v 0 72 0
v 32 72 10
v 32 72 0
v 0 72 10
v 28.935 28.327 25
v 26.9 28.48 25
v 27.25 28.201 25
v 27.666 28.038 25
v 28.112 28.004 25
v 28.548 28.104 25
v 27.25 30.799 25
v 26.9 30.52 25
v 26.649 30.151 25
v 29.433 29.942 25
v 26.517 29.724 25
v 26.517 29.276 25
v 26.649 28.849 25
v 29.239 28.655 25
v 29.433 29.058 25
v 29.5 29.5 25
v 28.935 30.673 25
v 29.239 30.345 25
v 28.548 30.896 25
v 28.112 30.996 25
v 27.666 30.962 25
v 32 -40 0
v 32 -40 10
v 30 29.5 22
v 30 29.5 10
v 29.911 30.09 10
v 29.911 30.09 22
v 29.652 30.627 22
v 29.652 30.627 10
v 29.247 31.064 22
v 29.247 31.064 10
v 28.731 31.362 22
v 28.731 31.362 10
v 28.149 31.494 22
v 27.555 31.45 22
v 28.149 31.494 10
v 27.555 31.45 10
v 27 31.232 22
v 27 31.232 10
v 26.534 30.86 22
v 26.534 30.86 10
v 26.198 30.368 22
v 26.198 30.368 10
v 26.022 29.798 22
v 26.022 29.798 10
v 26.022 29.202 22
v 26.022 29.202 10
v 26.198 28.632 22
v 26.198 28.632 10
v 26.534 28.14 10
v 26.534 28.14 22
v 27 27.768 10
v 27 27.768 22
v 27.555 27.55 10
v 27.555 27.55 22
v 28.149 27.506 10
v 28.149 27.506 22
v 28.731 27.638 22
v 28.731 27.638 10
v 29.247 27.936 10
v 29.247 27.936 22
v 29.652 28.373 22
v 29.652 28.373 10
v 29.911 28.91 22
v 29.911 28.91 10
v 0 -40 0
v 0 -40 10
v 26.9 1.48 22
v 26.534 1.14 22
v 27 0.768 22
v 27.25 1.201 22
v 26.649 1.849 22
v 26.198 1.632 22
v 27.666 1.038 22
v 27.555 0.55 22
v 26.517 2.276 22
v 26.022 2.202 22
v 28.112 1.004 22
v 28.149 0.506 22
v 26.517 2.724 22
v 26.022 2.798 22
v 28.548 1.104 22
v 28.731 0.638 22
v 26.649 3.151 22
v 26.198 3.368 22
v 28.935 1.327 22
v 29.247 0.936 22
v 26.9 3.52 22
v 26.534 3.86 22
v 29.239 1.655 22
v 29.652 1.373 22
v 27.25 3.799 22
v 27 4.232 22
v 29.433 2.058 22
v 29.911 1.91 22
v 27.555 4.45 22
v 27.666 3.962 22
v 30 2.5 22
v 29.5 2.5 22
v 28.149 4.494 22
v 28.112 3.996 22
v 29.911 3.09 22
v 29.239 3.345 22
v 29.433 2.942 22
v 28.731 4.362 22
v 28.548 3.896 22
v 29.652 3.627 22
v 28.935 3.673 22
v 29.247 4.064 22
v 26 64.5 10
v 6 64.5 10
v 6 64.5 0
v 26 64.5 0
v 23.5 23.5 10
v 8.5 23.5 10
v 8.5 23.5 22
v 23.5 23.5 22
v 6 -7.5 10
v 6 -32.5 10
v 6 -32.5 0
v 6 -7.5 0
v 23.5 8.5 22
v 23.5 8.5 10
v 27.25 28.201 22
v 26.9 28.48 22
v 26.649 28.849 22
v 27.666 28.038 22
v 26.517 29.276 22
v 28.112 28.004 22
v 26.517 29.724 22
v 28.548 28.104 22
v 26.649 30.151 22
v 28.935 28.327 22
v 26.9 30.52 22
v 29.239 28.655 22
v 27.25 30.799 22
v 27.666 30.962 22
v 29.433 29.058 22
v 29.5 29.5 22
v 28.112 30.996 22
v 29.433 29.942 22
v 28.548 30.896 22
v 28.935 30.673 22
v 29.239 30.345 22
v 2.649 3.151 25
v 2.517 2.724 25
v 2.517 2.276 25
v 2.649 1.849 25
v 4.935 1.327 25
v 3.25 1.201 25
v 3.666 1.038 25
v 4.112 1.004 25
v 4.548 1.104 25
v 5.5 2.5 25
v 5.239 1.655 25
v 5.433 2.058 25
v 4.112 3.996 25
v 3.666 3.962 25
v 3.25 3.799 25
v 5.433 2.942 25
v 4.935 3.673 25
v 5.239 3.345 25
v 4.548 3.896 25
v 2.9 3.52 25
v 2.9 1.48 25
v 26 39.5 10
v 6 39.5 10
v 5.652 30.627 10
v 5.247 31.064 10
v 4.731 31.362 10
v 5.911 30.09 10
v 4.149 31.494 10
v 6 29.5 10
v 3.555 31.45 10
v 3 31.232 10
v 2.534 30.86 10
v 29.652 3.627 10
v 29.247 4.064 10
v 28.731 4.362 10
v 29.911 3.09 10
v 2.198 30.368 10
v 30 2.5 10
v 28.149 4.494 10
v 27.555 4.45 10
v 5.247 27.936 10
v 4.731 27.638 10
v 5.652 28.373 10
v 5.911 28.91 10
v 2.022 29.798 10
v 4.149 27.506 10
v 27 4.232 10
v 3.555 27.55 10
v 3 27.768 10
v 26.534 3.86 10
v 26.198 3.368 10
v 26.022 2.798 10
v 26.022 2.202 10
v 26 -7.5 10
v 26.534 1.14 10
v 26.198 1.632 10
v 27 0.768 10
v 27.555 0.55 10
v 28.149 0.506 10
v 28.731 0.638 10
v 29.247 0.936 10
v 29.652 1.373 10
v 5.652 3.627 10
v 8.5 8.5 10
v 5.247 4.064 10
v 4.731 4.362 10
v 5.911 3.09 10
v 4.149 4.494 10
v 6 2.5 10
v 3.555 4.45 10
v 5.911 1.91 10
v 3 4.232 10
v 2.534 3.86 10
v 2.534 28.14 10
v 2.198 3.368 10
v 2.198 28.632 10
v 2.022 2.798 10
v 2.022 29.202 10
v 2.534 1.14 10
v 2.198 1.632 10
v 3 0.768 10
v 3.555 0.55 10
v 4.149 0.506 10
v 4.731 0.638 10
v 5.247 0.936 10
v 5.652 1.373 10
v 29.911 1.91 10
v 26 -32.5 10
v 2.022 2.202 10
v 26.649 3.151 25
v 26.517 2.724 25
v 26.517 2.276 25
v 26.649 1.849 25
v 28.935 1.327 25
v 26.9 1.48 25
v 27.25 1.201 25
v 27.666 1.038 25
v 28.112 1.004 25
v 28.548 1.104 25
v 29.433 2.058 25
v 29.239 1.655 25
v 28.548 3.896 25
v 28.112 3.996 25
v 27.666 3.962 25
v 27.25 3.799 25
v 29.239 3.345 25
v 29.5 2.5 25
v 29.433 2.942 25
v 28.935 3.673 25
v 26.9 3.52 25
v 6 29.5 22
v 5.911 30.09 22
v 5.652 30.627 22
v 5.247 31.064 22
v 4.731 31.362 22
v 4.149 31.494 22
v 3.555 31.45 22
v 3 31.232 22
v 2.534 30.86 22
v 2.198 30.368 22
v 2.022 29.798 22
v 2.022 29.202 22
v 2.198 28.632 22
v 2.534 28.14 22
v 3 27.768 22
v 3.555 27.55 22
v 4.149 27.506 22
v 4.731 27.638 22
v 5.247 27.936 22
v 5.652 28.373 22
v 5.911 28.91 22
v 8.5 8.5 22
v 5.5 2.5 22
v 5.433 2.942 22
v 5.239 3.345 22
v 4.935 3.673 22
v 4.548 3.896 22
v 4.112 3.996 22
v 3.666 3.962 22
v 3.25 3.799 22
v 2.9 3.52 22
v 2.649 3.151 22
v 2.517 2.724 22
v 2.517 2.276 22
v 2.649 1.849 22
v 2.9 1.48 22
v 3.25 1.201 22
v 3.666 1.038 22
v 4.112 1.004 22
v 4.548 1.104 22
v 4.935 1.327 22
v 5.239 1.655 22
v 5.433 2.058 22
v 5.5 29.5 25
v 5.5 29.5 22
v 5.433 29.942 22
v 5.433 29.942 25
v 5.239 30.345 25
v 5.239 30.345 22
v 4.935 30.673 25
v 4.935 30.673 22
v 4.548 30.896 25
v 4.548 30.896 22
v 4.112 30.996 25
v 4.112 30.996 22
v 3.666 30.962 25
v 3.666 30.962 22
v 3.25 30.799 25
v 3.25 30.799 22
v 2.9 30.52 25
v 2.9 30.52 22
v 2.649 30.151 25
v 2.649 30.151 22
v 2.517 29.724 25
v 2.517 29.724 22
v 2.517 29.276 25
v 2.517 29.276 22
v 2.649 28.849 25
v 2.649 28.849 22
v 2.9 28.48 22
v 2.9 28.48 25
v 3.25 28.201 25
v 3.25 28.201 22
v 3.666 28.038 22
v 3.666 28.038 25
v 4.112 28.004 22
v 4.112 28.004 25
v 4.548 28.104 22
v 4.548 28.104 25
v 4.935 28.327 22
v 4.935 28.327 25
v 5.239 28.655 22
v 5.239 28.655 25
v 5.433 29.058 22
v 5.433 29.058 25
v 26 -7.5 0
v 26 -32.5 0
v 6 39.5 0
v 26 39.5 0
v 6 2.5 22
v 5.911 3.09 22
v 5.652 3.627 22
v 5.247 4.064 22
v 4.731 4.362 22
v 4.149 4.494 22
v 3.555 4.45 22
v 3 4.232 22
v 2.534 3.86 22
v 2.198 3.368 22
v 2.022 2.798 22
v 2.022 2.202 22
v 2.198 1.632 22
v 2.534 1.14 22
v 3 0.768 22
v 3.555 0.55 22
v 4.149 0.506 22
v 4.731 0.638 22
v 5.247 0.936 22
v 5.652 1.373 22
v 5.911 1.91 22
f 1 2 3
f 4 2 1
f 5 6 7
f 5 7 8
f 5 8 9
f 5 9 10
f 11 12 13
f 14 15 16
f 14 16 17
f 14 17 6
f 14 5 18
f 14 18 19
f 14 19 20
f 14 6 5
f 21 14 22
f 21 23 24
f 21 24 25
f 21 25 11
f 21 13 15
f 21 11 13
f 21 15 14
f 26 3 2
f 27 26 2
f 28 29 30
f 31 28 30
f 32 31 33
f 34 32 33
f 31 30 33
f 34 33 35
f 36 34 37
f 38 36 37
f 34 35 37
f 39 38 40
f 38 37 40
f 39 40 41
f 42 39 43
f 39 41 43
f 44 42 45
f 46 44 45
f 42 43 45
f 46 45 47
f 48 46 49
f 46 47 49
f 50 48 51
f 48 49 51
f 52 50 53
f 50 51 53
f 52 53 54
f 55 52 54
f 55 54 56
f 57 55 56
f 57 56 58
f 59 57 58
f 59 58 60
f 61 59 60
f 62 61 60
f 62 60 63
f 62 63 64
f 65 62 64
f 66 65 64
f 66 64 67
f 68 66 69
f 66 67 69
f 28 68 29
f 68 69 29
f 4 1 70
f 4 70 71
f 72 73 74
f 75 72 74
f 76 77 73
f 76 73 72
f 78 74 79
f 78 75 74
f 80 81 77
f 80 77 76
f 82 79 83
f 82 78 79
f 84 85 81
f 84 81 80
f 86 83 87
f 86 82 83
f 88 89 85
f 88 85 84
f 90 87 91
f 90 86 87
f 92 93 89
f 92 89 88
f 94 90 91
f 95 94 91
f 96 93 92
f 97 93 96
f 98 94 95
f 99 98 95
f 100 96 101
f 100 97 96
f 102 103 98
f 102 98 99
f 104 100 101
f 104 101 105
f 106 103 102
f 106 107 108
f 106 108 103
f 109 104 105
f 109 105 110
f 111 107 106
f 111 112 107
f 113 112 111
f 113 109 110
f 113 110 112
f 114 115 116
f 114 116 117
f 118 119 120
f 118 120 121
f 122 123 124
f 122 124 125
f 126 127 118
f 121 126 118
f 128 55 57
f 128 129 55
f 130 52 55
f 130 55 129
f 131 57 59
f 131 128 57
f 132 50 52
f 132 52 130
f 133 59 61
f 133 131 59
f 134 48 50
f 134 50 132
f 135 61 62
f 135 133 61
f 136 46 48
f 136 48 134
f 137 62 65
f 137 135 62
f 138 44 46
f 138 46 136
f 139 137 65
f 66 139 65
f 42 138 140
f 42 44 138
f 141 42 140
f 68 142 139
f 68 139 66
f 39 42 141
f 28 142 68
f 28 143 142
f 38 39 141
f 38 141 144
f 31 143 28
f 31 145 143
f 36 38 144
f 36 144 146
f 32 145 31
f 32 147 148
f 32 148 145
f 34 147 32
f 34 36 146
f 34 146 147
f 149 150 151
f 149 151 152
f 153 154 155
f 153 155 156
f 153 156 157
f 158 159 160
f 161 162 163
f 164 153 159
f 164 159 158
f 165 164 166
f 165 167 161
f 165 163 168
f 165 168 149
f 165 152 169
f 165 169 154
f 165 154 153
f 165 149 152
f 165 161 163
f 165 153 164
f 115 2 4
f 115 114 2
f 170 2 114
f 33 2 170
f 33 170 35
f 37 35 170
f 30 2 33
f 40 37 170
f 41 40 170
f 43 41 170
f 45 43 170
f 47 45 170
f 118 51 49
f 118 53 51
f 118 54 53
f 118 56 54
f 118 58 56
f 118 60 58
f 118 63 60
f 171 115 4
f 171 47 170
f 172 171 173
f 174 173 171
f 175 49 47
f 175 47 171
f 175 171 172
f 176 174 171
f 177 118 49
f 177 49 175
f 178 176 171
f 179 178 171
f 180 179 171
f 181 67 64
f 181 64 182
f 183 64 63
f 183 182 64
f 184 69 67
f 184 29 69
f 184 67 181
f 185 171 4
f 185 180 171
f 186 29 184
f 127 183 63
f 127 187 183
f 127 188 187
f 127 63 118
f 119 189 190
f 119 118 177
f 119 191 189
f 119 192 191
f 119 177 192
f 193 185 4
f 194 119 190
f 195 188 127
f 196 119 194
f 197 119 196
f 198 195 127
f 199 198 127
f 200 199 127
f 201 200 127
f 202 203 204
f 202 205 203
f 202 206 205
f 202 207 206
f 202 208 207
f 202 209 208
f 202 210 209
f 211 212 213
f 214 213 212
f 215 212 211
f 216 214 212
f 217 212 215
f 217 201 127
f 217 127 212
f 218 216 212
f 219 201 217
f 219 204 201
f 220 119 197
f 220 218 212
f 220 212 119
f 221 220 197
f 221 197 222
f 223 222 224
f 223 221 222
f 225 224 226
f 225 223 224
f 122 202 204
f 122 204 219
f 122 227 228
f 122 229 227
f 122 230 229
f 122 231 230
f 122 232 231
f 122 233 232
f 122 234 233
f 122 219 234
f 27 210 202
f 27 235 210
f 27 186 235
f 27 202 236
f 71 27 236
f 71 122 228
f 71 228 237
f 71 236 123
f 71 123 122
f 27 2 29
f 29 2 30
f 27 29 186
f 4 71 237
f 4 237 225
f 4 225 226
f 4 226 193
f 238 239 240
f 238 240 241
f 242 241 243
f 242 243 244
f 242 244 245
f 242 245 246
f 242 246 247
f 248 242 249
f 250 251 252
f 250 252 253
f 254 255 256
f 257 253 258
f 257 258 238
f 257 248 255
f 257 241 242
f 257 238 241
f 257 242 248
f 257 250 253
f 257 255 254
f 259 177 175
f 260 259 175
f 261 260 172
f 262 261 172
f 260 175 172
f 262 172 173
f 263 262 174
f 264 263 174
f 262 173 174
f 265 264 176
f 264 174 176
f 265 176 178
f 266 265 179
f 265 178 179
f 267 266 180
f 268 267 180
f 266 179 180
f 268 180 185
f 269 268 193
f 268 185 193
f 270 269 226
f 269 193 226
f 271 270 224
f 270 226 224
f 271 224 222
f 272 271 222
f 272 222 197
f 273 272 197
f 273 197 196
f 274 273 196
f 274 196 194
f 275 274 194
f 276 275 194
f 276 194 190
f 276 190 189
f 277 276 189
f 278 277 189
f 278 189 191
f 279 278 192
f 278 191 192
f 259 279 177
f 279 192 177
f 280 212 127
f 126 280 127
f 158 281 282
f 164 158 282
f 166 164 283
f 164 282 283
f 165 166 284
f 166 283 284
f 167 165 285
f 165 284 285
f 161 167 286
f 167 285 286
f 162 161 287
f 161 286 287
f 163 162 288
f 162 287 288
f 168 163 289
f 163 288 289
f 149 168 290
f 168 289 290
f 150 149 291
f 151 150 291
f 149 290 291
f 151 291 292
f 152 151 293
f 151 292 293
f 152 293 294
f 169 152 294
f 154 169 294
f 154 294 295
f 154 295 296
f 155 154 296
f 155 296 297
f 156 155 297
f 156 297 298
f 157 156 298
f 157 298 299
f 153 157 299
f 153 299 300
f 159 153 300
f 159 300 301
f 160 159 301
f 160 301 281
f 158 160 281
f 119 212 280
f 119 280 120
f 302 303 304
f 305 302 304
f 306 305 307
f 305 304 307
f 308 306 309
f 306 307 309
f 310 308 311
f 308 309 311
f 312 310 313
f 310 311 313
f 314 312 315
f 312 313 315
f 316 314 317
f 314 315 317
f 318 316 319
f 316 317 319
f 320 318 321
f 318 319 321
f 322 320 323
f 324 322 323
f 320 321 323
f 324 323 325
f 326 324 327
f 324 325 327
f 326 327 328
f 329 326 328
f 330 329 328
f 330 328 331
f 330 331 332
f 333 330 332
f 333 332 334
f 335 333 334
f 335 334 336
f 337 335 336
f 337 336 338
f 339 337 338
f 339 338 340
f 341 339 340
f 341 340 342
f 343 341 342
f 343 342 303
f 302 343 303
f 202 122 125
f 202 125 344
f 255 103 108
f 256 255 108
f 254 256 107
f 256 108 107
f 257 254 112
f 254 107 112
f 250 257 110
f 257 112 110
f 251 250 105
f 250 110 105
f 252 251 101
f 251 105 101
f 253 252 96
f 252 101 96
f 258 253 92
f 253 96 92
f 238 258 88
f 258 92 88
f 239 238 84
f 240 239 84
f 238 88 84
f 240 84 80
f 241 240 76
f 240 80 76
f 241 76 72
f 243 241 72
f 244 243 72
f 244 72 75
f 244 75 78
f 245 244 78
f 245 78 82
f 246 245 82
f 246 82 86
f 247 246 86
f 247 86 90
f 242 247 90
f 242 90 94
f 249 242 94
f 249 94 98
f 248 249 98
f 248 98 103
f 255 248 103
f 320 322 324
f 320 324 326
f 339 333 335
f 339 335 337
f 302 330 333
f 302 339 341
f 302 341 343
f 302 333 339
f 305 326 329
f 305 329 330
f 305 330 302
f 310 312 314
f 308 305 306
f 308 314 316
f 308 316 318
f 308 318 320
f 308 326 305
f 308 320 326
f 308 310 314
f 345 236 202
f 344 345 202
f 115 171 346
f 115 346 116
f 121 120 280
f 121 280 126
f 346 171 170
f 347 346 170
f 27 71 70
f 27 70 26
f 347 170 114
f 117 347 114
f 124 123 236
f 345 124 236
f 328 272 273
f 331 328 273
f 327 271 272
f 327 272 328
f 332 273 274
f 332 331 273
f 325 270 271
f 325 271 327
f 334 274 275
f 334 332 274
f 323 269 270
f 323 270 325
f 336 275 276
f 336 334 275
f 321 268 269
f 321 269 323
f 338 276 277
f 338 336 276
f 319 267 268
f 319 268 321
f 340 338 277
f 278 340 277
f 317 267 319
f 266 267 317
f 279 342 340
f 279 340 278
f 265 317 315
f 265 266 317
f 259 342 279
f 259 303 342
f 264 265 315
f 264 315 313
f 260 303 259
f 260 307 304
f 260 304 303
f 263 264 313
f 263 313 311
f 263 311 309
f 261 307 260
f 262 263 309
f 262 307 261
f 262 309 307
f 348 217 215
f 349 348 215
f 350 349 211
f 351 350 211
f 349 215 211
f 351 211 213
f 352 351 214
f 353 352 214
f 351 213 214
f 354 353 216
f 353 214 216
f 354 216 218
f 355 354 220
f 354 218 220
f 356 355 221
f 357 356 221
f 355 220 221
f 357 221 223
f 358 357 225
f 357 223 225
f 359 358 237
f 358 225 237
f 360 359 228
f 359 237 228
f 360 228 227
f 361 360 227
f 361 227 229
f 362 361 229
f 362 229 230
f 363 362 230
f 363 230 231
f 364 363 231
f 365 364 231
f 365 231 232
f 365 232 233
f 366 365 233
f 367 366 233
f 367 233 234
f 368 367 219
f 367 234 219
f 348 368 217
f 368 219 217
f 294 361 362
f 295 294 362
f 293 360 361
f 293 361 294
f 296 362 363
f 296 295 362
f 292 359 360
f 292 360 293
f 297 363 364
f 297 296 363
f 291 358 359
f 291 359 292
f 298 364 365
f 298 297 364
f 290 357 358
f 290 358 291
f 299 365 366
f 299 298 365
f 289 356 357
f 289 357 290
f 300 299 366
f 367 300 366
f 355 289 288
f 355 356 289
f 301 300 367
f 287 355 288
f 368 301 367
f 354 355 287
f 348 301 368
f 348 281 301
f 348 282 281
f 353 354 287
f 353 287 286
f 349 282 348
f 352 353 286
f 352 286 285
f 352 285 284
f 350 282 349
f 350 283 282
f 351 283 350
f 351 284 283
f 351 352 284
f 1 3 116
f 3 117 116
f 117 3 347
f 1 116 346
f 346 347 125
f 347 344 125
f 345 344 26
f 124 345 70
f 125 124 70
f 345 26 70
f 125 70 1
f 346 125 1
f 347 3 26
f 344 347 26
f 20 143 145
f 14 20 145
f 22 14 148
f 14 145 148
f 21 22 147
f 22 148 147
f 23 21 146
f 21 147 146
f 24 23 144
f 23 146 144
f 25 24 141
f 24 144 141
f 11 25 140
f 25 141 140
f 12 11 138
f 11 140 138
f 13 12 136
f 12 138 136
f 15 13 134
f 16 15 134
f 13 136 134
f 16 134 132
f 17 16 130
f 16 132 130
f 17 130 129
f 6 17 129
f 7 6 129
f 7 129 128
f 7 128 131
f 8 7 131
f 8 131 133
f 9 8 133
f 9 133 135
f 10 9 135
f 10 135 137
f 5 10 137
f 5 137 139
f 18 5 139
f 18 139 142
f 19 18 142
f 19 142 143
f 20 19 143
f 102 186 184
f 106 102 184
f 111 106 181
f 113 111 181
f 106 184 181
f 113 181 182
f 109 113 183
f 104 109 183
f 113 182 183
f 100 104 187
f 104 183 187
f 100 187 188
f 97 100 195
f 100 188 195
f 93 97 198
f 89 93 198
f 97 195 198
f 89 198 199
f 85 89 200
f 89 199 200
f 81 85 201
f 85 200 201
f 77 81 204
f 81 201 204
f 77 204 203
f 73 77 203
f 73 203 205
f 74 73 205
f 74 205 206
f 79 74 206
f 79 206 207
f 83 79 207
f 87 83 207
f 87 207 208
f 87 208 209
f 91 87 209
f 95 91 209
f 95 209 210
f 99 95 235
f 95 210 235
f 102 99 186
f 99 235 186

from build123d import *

# Parameters (mm, degrees)
SKETCH_W        = 32
SKETCH_H        = 32
PAD_DEPTH       = 10
SKETCH001_R     = 1.5
PAD001_DEPTH    = 15
SKETCH002_R     = 2
SKETCH002_W     = 15
SKETCH002_H     = 15
PAD002_DEPTH    = 12
SKETCH003_W     = 32
SKETCH003_H     = 10
PAD003_DEPTH    = 40
SKETCH004_W     = 32
SKETCH004_H     = 10
PAD004_DEPTH    = 40
SKETCH006_W     = 20
SKETCH006_H     = 25
POCKET_DEPTH    = 10.001
SKETCH005_W     = 20
SKETCH005_H     = 25
POCKET001_DEPTH = 10.001


with BuildPart() as part:
    # Sketch → Pad (new body)
    with BuildSketch(Plane.XY):
        with Locations((16, 16)):
            Rectangle(SKETCH_W, SKETCH_H)
    extrude(amount=PAD_DEPTH)

    # Sketch001 (on Face6 of Pad) → Pad001 (join)
    with BuildSketch(Plane.XY.offset(10)):
        with Locations((4, 29.5)):
            Circle(SKETCH001_R)
        with Locations((28, 29.5)):
            Circle(SKETCH001_R)
        with Locations((4, 2.5)):
            Circle(SKETCH001_R)
        with Locations((28, 2.5)):
            Circle(SKETCH001_R)
    extrude(amount=PAD001_DEPTH)

    # Sketch002 (on Face5 of Pad001) → Pad002 (join)
    with BuildSketch(Plane.XY.offset(10)):
        with Locations((4, 2.5)):
            Circle(SKETCH002_R)
        with Locations((28, 2.5)):
            Circle(SKETCH002_R)
        with Locations((4, 29.5)):
            Circle(SKETCH002_R)
        with Locations((28, 29.5)):
            Circle(SKETCH002_R)
        with Locations((16, 16)):
            Rectangle(SKETCH002_W, SKETCH002_H)
    extrude(amount=PAD002_DEPTH)

    # Sketch003 (on Face1 of Pad002) → Pad003 (join)
    with BuildSketch(Plane.XZ):
        with Locations((16, 5)):
            Rectangle(SKETCH003_W, SKETCH003_H)
    extrude(amount=PAD003_DEPTH)

    # Sketch004 (on Face2 of Pad003) → Pad004 (join)
    with BuildSketch(Plane(origin=(0, 32, 0), x_dir=(-1, 0, 0), z_dir=(0, 1, 0))):
        with Locations((-16, 5)):
            Rectangle(SKETCH004_W, SKETCH004_H)
    extrude(amount=PAD004_DEPTH)

    # Sketch006 (on Face6 of Pad004) → Pocket (cut, through all)
    with BuildSketch(Plane.XY.offset(10)):
        with Locations((16, 52)):
            Rectangle(SKETCH006_W, SKETCH006_H)
    extrude(amount=-POCKET_DEPTH, mode=Mode.SUBTRACT)

    # Sketch005 (on Face10 of Pad004) → Pocket001 (cut, through all)
    with BuildSketch(Plane.XY.offset(10)):
        with Locations((16, -20)):
            Rectangle(SKETCH005_W, SKETCH005_H)
    extrude(amount=-POCKET001_DEPTH, mode=Mode.SUBTRACT)


solid = part.part
